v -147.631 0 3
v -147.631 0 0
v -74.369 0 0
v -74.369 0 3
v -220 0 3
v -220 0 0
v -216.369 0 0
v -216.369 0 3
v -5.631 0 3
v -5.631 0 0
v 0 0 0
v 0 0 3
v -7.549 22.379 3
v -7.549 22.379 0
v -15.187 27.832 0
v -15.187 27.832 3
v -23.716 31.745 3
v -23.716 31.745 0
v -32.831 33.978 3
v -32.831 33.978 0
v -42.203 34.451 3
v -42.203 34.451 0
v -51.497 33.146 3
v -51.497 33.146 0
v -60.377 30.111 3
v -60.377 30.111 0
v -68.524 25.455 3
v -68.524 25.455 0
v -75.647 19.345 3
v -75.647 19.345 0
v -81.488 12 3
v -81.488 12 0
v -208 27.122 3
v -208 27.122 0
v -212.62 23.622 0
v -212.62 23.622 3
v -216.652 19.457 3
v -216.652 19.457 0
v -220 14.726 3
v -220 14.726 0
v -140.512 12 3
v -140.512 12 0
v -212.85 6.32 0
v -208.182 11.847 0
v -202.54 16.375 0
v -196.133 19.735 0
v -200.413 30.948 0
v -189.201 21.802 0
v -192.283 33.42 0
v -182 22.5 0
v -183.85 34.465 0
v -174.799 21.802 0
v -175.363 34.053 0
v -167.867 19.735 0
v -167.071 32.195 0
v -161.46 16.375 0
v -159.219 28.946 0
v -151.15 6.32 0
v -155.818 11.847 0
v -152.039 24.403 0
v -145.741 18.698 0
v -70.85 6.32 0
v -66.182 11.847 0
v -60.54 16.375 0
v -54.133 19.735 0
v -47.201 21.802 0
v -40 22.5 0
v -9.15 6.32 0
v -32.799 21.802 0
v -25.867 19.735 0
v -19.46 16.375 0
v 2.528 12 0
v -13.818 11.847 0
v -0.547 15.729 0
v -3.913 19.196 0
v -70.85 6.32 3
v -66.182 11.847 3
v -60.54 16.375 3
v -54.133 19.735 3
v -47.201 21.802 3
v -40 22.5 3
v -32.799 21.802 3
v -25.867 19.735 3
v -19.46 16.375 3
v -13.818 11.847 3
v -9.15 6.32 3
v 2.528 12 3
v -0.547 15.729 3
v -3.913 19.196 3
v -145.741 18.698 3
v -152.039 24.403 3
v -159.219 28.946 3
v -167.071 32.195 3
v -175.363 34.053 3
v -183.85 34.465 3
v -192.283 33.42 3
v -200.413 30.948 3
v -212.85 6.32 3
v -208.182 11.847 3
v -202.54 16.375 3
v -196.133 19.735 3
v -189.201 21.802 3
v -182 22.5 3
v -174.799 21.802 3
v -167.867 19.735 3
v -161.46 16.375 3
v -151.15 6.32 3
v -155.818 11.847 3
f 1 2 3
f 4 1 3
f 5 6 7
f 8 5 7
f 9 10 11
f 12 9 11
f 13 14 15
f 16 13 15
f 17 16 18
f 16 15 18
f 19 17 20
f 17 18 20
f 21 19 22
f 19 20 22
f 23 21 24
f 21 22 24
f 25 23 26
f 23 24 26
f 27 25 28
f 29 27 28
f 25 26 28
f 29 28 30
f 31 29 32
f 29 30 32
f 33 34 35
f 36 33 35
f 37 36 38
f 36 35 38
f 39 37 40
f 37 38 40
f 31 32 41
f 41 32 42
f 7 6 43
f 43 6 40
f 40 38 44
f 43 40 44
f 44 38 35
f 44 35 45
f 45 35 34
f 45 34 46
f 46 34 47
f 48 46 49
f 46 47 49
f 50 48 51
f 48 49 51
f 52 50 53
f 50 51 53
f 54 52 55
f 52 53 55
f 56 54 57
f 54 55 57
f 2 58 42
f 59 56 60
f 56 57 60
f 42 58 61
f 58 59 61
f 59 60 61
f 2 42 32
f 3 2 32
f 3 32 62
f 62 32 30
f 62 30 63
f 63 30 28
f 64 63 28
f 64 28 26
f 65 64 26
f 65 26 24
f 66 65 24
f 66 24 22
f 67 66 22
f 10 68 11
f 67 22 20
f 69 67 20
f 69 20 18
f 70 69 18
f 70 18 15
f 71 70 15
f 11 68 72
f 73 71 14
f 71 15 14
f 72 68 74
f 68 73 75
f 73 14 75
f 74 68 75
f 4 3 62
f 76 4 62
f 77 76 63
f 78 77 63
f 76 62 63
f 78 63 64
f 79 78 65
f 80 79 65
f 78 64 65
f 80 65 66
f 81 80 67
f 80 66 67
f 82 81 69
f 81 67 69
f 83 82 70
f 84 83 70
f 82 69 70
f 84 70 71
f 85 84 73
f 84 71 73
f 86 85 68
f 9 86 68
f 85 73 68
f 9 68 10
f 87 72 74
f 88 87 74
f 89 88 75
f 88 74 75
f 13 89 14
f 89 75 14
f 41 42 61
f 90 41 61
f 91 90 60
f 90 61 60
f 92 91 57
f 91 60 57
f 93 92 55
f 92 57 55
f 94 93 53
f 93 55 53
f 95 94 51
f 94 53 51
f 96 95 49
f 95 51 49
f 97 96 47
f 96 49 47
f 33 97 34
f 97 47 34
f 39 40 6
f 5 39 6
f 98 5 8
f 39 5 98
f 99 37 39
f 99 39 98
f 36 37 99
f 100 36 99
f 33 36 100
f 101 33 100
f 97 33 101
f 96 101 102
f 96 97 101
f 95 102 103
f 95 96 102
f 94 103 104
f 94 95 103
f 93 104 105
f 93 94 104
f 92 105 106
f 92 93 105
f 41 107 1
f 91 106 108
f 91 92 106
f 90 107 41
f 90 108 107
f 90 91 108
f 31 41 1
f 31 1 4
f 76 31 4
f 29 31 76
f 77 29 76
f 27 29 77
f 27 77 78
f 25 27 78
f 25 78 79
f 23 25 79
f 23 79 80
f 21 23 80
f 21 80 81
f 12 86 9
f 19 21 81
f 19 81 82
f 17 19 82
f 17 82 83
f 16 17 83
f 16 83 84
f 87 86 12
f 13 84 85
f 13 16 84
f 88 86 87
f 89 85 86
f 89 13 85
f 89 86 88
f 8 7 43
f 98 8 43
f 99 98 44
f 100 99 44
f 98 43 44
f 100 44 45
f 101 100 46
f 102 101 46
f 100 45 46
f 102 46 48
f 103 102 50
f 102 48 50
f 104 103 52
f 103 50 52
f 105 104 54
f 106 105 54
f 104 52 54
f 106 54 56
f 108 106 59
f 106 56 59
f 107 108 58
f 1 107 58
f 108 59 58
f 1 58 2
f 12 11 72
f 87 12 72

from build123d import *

# Parameters (mm, degrees)
BOSS_EXTRUDE1_DEPTH = 3


with BuildPart() as part:
    # Sketch1 → Boss-Extrude1 (new body)
    with BuildSketch(Plane.XY):
        with BuildLine():
            Line((-5.630682288, 0), (0, 0))
            Line((0, 0), (2.527819158, 12))
            ThreePointArc((2.527819158, 12), (-2.1947123, 17.496295373), (-7.549171204, 22.379054435))
            ThreePointArc((-7.549171204, 22.379054435), (-46.881030658, 34.019398375), (-81.487950058, 12))
            Line((-81.487950058, 12), (-140.512049942, 12))
            ThreePointArc((-140.512049942, 12), (-171.177028416, 33.302311395), (-208, 27.121847063))
            ThreePointArc((-208, 27.121847063), (-214.715828047, 21.616866872), (-220, 14.725954012))
            Line((-220, 14.725954012), (-220, 0))
            Line((-220, 0), (-216.369317712, 0))
            ThreePointArc((-216.369317712, 0), (-182, 22.5), (-147.630682288, 0))
            Line((-147.630682288, 0), (-74.369317712, 0))
            ThreePointArc((-74.369317712, 0), (-40, 22.5), (-5.630682288, 0))
        make_face()
    extrude(amount=BOSS_EXTRUDE1_DEPTH)


solid = part.part
